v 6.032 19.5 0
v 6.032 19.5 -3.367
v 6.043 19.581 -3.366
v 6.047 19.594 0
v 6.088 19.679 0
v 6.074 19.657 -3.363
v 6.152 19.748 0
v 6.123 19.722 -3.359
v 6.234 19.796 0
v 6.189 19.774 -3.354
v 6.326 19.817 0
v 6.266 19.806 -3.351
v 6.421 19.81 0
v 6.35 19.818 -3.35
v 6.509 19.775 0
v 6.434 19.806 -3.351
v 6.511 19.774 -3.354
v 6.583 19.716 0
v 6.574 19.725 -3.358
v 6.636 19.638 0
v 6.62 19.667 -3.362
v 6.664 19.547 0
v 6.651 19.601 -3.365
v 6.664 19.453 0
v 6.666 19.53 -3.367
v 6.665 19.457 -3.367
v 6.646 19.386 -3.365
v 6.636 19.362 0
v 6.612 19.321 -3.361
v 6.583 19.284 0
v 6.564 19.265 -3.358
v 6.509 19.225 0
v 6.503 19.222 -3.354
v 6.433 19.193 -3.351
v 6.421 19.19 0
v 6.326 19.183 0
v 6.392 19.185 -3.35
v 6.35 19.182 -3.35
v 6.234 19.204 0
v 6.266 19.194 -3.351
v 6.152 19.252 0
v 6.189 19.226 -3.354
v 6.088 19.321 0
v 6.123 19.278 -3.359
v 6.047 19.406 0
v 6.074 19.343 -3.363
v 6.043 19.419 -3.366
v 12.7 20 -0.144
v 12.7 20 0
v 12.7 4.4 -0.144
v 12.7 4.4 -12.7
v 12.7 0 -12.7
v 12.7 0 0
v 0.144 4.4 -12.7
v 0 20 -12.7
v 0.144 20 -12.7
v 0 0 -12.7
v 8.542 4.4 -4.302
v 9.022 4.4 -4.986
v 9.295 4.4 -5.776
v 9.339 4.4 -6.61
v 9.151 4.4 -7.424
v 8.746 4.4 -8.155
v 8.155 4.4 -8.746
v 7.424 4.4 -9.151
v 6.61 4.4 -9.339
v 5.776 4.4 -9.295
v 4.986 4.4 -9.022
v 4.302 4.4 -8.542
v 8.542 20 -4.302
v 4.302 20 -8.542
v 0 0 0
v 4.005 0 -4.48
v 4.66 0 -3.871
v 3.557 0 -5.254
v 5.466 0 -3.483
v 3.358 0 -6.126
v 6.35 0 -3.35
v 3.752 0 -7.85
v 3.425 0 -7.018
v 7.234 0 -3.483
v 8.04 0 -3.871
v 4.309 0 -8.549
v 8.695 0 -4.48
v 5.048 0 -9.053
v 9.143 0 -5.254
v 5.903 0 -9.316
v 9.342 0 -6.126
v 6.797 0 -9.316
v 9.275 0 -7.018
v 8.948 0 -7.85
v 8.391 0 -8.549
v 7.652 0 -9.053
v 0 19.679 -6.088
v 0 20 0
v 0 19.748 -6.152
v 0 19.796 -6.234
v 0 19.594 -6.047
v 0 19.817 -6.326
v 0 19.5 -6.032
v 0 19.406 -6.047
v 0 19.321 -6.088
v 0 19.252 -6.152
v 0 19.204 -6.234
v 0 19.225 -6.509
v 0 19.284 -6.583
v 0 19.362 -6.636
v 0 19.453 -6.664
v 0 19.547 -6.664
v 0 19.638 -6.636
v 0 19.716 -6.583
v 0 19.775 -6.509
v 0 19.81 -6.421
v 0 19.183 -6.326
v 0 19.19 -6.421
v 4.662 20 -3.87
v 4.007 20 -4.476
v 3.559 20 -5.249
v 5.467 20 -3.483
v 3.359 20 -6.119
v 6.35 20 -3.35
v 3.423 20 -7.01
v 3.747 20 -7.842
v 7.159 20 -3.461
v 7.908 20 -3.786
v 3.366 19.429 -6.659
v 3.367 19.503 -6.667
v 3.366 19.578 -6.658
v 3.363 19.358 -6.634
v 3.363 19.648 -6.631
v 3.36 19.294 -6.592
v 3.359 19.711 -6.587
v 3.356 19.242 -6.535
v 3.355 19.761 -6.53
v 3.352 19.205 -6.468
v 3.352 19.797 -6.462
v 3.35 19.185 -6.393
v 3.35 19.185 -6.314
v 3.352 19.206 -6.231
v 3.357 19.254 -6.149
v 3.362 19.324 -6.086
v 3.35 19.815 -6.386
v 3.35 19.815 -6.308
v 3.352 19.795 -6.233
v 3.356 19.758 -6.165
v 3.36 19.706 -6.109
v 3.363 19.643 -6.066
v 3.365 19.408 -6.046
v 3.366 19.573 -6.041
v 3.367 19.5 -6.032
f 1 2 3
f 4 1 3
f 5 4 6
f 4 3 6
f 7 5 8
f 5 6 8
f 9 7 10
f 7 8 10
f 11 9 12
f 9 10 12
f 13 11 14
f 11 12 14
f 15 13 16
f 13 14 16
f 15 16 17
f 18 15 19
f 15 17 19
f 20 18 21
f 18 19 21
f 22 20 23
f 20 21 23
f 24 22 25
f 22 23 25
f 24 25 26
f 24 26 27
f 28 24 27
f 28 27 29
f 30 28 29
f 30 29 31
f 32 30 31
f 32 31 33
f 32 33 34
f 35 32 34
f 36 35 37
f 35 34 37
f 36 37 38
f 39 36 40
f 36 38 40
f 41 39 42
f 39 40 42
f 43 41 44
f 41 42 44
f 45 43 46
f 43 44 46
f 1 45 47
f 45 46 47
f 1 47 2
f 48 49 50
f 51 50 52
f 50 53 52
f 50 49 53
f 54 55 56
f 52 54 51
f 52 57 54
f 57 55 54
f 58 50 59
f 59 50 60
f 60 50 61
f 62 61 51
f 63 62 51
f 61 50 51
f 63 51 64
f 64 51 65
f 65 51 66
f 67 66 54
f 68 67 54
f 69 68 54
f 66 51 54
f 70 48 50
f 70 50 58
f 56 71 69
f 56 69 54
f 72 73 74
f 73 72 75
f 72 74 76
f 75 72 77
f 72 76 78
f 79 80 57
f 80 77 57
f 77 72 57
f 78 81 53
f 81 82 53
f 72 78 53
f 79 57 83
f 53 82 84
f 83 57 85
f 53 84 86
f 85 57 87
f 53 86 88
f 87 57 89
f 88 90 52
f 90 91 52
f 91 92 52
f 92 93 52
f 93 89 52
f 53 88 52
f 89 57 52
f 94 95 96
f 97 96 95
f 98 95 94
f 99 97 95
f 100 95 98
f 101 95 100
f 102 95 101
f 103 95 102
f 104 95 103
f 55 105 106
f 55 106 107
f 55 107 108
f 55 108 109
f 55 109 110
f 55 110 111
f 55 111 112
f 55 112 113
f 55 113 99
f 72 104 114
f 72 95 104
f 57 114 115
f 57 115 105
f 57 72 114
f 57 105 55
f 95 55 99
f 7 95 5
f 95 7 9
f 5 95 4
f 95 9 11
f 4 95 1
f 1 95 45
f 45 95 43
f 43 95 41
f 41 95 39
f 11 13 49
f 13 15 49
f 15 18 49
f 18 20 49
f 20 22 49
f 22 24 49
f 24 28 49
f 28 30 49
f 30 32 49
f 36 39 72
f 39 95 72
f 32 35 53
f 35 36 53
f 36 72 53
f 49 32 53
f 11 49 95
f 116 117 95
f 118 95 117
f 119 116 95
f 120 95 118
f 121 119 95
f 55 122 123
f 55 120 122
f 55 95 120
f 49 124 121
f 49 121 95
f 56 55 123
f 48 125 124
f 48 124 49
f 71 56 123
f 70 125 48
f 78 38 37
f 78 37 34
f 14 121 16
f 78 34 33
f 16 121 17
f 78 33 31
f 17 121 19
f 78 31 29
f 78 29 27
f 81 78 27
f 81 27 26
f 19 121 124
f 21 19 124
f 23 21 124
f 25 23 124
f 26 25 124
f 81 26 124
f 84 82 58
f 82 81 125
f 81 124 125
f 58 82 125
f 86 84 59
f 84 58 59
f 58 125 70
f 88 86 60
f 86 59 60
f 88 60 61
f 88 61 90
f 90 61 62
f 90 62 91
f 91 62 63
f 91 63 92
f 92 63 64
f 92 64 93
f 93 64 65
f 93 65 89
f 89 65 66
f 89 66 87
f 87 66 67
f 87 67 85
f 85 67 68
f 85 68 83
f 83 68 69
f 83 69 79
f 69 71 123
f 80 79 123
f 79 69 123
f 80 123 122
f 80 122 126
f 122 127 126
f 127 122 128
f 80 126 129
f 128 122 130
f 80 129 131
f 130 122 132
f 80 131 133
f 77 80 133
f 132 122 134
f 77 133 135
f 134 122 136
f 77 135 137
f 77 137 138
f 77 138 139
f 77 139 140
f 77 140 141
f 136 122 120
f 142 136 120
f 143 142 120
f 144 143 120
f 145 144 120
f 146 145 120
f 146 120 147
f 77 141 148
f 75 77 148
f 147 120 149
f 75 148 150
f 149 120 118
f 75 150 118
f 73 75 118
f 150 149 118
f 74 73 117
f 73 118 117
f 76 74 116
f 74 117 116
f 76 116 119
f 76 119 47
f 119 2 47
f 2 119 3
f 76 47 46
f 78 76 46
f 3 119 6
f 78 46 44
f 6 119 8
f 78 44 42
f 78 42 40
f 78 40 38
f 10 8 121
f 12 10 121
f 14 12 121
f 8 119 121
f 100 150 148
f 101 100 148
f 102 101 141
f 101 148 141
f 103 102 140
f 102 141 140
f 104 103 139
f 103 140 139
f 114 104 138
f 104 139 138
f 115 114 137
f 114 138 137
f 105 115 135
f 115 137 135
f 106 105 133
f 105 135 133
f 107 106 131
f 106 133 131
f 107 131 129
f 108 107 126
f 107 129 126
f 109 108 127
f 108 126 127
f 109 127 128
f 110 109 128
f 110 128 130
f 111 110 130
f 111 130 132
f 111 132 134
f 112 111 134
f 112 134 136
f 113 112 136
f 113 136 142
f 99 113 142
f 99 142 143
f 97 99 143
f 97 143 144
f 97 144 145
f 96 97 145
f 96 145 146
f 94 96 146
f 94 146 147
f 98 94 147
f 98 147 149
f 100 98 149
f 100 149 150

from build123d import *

# Parameters (mm, degrees)
SKETCH1_W                             = 12.7
SKETCH1_H                             = 12.7
BOSS_EXTRUDE1_DEPTH                   = 20
SKETCH2_R                             = 3
CUT_EXTRUDE1_DEPTH                    = 27.880848201
CUT_EXTRUDE2_DEPTH                    = 15.6
F_72_0_025_DIAMETER_HOLE1_D           = 0.635
F_72_0_025_DIAMETER_HOLE1_ON_FACE_2_D = 0.635


with BuildPart() as part:
    # Sketch1 → Boss-Extrude1 (new body)
    with BuildSketch(Plane(origin=(0, 0, 0), x_dir=(1, 0, 0), z_dir=(0, 1, 0))):
        with Locations((6.35, 6.35)):
            Rectangle(SKETCH1_W, SKETCH1_H)
    extrude(amount=BOSS_EXTRUDE1_DEPTH)

    # Sketch2 → Cut-Extrude1 (cut, through all)
    with BuildSketch(Plane(origin=(0, 20, 0), x_dir=(1, 0, 0), z_dir=(0, 1, 0))):
        with Locations(Location((6.35, 6.35, 0), (0, 0, 270))):
            Circle(SKETCH2_R)
    extrude(amount=-CUT_EXTRUDE1_DEPTH, mode=Mode.SUBTRACT)

    # Sketch3 → Cut-Extrude2 (cut)
    with BuildSketch(Plane(origin=(0, 20, 0), x_dir=(1, 0, 0), z_dir=(0, 1, 0))):
        Polygon((12.7, 0.143684098), (0.143684098, 12.7), (12.7, 12.7), align=None)
    extrude(amount=-CUT_EXTRUDE2_DEPTH, mode=Mode.SUBTRACT)

    # #72 (0.025) Diameter Hole1 (through all)
    with Locations(Plane(origin=(6.35, 19.5, 0), x_dir=(1, 0, 0), z_dir=(0, 0, 1))):
        with Locations((0, 0)):
            Hole(F_72_0_025_DIAMETER_HOLE1_D / 2)

    # #72 (0.025) Diameter Hole1 on face 2 (through all)
    with Locations(Plane(origin=(0, 19.5, -6.35), x_dir=(0, 0, -1), z_dir=(-1, 0, 0))):
        with Locations((0, 0)):
            Hole(F_72_0_025_DIAMETER_HOLE1_ON_FACE_2_D / 2)


solid = part.part
